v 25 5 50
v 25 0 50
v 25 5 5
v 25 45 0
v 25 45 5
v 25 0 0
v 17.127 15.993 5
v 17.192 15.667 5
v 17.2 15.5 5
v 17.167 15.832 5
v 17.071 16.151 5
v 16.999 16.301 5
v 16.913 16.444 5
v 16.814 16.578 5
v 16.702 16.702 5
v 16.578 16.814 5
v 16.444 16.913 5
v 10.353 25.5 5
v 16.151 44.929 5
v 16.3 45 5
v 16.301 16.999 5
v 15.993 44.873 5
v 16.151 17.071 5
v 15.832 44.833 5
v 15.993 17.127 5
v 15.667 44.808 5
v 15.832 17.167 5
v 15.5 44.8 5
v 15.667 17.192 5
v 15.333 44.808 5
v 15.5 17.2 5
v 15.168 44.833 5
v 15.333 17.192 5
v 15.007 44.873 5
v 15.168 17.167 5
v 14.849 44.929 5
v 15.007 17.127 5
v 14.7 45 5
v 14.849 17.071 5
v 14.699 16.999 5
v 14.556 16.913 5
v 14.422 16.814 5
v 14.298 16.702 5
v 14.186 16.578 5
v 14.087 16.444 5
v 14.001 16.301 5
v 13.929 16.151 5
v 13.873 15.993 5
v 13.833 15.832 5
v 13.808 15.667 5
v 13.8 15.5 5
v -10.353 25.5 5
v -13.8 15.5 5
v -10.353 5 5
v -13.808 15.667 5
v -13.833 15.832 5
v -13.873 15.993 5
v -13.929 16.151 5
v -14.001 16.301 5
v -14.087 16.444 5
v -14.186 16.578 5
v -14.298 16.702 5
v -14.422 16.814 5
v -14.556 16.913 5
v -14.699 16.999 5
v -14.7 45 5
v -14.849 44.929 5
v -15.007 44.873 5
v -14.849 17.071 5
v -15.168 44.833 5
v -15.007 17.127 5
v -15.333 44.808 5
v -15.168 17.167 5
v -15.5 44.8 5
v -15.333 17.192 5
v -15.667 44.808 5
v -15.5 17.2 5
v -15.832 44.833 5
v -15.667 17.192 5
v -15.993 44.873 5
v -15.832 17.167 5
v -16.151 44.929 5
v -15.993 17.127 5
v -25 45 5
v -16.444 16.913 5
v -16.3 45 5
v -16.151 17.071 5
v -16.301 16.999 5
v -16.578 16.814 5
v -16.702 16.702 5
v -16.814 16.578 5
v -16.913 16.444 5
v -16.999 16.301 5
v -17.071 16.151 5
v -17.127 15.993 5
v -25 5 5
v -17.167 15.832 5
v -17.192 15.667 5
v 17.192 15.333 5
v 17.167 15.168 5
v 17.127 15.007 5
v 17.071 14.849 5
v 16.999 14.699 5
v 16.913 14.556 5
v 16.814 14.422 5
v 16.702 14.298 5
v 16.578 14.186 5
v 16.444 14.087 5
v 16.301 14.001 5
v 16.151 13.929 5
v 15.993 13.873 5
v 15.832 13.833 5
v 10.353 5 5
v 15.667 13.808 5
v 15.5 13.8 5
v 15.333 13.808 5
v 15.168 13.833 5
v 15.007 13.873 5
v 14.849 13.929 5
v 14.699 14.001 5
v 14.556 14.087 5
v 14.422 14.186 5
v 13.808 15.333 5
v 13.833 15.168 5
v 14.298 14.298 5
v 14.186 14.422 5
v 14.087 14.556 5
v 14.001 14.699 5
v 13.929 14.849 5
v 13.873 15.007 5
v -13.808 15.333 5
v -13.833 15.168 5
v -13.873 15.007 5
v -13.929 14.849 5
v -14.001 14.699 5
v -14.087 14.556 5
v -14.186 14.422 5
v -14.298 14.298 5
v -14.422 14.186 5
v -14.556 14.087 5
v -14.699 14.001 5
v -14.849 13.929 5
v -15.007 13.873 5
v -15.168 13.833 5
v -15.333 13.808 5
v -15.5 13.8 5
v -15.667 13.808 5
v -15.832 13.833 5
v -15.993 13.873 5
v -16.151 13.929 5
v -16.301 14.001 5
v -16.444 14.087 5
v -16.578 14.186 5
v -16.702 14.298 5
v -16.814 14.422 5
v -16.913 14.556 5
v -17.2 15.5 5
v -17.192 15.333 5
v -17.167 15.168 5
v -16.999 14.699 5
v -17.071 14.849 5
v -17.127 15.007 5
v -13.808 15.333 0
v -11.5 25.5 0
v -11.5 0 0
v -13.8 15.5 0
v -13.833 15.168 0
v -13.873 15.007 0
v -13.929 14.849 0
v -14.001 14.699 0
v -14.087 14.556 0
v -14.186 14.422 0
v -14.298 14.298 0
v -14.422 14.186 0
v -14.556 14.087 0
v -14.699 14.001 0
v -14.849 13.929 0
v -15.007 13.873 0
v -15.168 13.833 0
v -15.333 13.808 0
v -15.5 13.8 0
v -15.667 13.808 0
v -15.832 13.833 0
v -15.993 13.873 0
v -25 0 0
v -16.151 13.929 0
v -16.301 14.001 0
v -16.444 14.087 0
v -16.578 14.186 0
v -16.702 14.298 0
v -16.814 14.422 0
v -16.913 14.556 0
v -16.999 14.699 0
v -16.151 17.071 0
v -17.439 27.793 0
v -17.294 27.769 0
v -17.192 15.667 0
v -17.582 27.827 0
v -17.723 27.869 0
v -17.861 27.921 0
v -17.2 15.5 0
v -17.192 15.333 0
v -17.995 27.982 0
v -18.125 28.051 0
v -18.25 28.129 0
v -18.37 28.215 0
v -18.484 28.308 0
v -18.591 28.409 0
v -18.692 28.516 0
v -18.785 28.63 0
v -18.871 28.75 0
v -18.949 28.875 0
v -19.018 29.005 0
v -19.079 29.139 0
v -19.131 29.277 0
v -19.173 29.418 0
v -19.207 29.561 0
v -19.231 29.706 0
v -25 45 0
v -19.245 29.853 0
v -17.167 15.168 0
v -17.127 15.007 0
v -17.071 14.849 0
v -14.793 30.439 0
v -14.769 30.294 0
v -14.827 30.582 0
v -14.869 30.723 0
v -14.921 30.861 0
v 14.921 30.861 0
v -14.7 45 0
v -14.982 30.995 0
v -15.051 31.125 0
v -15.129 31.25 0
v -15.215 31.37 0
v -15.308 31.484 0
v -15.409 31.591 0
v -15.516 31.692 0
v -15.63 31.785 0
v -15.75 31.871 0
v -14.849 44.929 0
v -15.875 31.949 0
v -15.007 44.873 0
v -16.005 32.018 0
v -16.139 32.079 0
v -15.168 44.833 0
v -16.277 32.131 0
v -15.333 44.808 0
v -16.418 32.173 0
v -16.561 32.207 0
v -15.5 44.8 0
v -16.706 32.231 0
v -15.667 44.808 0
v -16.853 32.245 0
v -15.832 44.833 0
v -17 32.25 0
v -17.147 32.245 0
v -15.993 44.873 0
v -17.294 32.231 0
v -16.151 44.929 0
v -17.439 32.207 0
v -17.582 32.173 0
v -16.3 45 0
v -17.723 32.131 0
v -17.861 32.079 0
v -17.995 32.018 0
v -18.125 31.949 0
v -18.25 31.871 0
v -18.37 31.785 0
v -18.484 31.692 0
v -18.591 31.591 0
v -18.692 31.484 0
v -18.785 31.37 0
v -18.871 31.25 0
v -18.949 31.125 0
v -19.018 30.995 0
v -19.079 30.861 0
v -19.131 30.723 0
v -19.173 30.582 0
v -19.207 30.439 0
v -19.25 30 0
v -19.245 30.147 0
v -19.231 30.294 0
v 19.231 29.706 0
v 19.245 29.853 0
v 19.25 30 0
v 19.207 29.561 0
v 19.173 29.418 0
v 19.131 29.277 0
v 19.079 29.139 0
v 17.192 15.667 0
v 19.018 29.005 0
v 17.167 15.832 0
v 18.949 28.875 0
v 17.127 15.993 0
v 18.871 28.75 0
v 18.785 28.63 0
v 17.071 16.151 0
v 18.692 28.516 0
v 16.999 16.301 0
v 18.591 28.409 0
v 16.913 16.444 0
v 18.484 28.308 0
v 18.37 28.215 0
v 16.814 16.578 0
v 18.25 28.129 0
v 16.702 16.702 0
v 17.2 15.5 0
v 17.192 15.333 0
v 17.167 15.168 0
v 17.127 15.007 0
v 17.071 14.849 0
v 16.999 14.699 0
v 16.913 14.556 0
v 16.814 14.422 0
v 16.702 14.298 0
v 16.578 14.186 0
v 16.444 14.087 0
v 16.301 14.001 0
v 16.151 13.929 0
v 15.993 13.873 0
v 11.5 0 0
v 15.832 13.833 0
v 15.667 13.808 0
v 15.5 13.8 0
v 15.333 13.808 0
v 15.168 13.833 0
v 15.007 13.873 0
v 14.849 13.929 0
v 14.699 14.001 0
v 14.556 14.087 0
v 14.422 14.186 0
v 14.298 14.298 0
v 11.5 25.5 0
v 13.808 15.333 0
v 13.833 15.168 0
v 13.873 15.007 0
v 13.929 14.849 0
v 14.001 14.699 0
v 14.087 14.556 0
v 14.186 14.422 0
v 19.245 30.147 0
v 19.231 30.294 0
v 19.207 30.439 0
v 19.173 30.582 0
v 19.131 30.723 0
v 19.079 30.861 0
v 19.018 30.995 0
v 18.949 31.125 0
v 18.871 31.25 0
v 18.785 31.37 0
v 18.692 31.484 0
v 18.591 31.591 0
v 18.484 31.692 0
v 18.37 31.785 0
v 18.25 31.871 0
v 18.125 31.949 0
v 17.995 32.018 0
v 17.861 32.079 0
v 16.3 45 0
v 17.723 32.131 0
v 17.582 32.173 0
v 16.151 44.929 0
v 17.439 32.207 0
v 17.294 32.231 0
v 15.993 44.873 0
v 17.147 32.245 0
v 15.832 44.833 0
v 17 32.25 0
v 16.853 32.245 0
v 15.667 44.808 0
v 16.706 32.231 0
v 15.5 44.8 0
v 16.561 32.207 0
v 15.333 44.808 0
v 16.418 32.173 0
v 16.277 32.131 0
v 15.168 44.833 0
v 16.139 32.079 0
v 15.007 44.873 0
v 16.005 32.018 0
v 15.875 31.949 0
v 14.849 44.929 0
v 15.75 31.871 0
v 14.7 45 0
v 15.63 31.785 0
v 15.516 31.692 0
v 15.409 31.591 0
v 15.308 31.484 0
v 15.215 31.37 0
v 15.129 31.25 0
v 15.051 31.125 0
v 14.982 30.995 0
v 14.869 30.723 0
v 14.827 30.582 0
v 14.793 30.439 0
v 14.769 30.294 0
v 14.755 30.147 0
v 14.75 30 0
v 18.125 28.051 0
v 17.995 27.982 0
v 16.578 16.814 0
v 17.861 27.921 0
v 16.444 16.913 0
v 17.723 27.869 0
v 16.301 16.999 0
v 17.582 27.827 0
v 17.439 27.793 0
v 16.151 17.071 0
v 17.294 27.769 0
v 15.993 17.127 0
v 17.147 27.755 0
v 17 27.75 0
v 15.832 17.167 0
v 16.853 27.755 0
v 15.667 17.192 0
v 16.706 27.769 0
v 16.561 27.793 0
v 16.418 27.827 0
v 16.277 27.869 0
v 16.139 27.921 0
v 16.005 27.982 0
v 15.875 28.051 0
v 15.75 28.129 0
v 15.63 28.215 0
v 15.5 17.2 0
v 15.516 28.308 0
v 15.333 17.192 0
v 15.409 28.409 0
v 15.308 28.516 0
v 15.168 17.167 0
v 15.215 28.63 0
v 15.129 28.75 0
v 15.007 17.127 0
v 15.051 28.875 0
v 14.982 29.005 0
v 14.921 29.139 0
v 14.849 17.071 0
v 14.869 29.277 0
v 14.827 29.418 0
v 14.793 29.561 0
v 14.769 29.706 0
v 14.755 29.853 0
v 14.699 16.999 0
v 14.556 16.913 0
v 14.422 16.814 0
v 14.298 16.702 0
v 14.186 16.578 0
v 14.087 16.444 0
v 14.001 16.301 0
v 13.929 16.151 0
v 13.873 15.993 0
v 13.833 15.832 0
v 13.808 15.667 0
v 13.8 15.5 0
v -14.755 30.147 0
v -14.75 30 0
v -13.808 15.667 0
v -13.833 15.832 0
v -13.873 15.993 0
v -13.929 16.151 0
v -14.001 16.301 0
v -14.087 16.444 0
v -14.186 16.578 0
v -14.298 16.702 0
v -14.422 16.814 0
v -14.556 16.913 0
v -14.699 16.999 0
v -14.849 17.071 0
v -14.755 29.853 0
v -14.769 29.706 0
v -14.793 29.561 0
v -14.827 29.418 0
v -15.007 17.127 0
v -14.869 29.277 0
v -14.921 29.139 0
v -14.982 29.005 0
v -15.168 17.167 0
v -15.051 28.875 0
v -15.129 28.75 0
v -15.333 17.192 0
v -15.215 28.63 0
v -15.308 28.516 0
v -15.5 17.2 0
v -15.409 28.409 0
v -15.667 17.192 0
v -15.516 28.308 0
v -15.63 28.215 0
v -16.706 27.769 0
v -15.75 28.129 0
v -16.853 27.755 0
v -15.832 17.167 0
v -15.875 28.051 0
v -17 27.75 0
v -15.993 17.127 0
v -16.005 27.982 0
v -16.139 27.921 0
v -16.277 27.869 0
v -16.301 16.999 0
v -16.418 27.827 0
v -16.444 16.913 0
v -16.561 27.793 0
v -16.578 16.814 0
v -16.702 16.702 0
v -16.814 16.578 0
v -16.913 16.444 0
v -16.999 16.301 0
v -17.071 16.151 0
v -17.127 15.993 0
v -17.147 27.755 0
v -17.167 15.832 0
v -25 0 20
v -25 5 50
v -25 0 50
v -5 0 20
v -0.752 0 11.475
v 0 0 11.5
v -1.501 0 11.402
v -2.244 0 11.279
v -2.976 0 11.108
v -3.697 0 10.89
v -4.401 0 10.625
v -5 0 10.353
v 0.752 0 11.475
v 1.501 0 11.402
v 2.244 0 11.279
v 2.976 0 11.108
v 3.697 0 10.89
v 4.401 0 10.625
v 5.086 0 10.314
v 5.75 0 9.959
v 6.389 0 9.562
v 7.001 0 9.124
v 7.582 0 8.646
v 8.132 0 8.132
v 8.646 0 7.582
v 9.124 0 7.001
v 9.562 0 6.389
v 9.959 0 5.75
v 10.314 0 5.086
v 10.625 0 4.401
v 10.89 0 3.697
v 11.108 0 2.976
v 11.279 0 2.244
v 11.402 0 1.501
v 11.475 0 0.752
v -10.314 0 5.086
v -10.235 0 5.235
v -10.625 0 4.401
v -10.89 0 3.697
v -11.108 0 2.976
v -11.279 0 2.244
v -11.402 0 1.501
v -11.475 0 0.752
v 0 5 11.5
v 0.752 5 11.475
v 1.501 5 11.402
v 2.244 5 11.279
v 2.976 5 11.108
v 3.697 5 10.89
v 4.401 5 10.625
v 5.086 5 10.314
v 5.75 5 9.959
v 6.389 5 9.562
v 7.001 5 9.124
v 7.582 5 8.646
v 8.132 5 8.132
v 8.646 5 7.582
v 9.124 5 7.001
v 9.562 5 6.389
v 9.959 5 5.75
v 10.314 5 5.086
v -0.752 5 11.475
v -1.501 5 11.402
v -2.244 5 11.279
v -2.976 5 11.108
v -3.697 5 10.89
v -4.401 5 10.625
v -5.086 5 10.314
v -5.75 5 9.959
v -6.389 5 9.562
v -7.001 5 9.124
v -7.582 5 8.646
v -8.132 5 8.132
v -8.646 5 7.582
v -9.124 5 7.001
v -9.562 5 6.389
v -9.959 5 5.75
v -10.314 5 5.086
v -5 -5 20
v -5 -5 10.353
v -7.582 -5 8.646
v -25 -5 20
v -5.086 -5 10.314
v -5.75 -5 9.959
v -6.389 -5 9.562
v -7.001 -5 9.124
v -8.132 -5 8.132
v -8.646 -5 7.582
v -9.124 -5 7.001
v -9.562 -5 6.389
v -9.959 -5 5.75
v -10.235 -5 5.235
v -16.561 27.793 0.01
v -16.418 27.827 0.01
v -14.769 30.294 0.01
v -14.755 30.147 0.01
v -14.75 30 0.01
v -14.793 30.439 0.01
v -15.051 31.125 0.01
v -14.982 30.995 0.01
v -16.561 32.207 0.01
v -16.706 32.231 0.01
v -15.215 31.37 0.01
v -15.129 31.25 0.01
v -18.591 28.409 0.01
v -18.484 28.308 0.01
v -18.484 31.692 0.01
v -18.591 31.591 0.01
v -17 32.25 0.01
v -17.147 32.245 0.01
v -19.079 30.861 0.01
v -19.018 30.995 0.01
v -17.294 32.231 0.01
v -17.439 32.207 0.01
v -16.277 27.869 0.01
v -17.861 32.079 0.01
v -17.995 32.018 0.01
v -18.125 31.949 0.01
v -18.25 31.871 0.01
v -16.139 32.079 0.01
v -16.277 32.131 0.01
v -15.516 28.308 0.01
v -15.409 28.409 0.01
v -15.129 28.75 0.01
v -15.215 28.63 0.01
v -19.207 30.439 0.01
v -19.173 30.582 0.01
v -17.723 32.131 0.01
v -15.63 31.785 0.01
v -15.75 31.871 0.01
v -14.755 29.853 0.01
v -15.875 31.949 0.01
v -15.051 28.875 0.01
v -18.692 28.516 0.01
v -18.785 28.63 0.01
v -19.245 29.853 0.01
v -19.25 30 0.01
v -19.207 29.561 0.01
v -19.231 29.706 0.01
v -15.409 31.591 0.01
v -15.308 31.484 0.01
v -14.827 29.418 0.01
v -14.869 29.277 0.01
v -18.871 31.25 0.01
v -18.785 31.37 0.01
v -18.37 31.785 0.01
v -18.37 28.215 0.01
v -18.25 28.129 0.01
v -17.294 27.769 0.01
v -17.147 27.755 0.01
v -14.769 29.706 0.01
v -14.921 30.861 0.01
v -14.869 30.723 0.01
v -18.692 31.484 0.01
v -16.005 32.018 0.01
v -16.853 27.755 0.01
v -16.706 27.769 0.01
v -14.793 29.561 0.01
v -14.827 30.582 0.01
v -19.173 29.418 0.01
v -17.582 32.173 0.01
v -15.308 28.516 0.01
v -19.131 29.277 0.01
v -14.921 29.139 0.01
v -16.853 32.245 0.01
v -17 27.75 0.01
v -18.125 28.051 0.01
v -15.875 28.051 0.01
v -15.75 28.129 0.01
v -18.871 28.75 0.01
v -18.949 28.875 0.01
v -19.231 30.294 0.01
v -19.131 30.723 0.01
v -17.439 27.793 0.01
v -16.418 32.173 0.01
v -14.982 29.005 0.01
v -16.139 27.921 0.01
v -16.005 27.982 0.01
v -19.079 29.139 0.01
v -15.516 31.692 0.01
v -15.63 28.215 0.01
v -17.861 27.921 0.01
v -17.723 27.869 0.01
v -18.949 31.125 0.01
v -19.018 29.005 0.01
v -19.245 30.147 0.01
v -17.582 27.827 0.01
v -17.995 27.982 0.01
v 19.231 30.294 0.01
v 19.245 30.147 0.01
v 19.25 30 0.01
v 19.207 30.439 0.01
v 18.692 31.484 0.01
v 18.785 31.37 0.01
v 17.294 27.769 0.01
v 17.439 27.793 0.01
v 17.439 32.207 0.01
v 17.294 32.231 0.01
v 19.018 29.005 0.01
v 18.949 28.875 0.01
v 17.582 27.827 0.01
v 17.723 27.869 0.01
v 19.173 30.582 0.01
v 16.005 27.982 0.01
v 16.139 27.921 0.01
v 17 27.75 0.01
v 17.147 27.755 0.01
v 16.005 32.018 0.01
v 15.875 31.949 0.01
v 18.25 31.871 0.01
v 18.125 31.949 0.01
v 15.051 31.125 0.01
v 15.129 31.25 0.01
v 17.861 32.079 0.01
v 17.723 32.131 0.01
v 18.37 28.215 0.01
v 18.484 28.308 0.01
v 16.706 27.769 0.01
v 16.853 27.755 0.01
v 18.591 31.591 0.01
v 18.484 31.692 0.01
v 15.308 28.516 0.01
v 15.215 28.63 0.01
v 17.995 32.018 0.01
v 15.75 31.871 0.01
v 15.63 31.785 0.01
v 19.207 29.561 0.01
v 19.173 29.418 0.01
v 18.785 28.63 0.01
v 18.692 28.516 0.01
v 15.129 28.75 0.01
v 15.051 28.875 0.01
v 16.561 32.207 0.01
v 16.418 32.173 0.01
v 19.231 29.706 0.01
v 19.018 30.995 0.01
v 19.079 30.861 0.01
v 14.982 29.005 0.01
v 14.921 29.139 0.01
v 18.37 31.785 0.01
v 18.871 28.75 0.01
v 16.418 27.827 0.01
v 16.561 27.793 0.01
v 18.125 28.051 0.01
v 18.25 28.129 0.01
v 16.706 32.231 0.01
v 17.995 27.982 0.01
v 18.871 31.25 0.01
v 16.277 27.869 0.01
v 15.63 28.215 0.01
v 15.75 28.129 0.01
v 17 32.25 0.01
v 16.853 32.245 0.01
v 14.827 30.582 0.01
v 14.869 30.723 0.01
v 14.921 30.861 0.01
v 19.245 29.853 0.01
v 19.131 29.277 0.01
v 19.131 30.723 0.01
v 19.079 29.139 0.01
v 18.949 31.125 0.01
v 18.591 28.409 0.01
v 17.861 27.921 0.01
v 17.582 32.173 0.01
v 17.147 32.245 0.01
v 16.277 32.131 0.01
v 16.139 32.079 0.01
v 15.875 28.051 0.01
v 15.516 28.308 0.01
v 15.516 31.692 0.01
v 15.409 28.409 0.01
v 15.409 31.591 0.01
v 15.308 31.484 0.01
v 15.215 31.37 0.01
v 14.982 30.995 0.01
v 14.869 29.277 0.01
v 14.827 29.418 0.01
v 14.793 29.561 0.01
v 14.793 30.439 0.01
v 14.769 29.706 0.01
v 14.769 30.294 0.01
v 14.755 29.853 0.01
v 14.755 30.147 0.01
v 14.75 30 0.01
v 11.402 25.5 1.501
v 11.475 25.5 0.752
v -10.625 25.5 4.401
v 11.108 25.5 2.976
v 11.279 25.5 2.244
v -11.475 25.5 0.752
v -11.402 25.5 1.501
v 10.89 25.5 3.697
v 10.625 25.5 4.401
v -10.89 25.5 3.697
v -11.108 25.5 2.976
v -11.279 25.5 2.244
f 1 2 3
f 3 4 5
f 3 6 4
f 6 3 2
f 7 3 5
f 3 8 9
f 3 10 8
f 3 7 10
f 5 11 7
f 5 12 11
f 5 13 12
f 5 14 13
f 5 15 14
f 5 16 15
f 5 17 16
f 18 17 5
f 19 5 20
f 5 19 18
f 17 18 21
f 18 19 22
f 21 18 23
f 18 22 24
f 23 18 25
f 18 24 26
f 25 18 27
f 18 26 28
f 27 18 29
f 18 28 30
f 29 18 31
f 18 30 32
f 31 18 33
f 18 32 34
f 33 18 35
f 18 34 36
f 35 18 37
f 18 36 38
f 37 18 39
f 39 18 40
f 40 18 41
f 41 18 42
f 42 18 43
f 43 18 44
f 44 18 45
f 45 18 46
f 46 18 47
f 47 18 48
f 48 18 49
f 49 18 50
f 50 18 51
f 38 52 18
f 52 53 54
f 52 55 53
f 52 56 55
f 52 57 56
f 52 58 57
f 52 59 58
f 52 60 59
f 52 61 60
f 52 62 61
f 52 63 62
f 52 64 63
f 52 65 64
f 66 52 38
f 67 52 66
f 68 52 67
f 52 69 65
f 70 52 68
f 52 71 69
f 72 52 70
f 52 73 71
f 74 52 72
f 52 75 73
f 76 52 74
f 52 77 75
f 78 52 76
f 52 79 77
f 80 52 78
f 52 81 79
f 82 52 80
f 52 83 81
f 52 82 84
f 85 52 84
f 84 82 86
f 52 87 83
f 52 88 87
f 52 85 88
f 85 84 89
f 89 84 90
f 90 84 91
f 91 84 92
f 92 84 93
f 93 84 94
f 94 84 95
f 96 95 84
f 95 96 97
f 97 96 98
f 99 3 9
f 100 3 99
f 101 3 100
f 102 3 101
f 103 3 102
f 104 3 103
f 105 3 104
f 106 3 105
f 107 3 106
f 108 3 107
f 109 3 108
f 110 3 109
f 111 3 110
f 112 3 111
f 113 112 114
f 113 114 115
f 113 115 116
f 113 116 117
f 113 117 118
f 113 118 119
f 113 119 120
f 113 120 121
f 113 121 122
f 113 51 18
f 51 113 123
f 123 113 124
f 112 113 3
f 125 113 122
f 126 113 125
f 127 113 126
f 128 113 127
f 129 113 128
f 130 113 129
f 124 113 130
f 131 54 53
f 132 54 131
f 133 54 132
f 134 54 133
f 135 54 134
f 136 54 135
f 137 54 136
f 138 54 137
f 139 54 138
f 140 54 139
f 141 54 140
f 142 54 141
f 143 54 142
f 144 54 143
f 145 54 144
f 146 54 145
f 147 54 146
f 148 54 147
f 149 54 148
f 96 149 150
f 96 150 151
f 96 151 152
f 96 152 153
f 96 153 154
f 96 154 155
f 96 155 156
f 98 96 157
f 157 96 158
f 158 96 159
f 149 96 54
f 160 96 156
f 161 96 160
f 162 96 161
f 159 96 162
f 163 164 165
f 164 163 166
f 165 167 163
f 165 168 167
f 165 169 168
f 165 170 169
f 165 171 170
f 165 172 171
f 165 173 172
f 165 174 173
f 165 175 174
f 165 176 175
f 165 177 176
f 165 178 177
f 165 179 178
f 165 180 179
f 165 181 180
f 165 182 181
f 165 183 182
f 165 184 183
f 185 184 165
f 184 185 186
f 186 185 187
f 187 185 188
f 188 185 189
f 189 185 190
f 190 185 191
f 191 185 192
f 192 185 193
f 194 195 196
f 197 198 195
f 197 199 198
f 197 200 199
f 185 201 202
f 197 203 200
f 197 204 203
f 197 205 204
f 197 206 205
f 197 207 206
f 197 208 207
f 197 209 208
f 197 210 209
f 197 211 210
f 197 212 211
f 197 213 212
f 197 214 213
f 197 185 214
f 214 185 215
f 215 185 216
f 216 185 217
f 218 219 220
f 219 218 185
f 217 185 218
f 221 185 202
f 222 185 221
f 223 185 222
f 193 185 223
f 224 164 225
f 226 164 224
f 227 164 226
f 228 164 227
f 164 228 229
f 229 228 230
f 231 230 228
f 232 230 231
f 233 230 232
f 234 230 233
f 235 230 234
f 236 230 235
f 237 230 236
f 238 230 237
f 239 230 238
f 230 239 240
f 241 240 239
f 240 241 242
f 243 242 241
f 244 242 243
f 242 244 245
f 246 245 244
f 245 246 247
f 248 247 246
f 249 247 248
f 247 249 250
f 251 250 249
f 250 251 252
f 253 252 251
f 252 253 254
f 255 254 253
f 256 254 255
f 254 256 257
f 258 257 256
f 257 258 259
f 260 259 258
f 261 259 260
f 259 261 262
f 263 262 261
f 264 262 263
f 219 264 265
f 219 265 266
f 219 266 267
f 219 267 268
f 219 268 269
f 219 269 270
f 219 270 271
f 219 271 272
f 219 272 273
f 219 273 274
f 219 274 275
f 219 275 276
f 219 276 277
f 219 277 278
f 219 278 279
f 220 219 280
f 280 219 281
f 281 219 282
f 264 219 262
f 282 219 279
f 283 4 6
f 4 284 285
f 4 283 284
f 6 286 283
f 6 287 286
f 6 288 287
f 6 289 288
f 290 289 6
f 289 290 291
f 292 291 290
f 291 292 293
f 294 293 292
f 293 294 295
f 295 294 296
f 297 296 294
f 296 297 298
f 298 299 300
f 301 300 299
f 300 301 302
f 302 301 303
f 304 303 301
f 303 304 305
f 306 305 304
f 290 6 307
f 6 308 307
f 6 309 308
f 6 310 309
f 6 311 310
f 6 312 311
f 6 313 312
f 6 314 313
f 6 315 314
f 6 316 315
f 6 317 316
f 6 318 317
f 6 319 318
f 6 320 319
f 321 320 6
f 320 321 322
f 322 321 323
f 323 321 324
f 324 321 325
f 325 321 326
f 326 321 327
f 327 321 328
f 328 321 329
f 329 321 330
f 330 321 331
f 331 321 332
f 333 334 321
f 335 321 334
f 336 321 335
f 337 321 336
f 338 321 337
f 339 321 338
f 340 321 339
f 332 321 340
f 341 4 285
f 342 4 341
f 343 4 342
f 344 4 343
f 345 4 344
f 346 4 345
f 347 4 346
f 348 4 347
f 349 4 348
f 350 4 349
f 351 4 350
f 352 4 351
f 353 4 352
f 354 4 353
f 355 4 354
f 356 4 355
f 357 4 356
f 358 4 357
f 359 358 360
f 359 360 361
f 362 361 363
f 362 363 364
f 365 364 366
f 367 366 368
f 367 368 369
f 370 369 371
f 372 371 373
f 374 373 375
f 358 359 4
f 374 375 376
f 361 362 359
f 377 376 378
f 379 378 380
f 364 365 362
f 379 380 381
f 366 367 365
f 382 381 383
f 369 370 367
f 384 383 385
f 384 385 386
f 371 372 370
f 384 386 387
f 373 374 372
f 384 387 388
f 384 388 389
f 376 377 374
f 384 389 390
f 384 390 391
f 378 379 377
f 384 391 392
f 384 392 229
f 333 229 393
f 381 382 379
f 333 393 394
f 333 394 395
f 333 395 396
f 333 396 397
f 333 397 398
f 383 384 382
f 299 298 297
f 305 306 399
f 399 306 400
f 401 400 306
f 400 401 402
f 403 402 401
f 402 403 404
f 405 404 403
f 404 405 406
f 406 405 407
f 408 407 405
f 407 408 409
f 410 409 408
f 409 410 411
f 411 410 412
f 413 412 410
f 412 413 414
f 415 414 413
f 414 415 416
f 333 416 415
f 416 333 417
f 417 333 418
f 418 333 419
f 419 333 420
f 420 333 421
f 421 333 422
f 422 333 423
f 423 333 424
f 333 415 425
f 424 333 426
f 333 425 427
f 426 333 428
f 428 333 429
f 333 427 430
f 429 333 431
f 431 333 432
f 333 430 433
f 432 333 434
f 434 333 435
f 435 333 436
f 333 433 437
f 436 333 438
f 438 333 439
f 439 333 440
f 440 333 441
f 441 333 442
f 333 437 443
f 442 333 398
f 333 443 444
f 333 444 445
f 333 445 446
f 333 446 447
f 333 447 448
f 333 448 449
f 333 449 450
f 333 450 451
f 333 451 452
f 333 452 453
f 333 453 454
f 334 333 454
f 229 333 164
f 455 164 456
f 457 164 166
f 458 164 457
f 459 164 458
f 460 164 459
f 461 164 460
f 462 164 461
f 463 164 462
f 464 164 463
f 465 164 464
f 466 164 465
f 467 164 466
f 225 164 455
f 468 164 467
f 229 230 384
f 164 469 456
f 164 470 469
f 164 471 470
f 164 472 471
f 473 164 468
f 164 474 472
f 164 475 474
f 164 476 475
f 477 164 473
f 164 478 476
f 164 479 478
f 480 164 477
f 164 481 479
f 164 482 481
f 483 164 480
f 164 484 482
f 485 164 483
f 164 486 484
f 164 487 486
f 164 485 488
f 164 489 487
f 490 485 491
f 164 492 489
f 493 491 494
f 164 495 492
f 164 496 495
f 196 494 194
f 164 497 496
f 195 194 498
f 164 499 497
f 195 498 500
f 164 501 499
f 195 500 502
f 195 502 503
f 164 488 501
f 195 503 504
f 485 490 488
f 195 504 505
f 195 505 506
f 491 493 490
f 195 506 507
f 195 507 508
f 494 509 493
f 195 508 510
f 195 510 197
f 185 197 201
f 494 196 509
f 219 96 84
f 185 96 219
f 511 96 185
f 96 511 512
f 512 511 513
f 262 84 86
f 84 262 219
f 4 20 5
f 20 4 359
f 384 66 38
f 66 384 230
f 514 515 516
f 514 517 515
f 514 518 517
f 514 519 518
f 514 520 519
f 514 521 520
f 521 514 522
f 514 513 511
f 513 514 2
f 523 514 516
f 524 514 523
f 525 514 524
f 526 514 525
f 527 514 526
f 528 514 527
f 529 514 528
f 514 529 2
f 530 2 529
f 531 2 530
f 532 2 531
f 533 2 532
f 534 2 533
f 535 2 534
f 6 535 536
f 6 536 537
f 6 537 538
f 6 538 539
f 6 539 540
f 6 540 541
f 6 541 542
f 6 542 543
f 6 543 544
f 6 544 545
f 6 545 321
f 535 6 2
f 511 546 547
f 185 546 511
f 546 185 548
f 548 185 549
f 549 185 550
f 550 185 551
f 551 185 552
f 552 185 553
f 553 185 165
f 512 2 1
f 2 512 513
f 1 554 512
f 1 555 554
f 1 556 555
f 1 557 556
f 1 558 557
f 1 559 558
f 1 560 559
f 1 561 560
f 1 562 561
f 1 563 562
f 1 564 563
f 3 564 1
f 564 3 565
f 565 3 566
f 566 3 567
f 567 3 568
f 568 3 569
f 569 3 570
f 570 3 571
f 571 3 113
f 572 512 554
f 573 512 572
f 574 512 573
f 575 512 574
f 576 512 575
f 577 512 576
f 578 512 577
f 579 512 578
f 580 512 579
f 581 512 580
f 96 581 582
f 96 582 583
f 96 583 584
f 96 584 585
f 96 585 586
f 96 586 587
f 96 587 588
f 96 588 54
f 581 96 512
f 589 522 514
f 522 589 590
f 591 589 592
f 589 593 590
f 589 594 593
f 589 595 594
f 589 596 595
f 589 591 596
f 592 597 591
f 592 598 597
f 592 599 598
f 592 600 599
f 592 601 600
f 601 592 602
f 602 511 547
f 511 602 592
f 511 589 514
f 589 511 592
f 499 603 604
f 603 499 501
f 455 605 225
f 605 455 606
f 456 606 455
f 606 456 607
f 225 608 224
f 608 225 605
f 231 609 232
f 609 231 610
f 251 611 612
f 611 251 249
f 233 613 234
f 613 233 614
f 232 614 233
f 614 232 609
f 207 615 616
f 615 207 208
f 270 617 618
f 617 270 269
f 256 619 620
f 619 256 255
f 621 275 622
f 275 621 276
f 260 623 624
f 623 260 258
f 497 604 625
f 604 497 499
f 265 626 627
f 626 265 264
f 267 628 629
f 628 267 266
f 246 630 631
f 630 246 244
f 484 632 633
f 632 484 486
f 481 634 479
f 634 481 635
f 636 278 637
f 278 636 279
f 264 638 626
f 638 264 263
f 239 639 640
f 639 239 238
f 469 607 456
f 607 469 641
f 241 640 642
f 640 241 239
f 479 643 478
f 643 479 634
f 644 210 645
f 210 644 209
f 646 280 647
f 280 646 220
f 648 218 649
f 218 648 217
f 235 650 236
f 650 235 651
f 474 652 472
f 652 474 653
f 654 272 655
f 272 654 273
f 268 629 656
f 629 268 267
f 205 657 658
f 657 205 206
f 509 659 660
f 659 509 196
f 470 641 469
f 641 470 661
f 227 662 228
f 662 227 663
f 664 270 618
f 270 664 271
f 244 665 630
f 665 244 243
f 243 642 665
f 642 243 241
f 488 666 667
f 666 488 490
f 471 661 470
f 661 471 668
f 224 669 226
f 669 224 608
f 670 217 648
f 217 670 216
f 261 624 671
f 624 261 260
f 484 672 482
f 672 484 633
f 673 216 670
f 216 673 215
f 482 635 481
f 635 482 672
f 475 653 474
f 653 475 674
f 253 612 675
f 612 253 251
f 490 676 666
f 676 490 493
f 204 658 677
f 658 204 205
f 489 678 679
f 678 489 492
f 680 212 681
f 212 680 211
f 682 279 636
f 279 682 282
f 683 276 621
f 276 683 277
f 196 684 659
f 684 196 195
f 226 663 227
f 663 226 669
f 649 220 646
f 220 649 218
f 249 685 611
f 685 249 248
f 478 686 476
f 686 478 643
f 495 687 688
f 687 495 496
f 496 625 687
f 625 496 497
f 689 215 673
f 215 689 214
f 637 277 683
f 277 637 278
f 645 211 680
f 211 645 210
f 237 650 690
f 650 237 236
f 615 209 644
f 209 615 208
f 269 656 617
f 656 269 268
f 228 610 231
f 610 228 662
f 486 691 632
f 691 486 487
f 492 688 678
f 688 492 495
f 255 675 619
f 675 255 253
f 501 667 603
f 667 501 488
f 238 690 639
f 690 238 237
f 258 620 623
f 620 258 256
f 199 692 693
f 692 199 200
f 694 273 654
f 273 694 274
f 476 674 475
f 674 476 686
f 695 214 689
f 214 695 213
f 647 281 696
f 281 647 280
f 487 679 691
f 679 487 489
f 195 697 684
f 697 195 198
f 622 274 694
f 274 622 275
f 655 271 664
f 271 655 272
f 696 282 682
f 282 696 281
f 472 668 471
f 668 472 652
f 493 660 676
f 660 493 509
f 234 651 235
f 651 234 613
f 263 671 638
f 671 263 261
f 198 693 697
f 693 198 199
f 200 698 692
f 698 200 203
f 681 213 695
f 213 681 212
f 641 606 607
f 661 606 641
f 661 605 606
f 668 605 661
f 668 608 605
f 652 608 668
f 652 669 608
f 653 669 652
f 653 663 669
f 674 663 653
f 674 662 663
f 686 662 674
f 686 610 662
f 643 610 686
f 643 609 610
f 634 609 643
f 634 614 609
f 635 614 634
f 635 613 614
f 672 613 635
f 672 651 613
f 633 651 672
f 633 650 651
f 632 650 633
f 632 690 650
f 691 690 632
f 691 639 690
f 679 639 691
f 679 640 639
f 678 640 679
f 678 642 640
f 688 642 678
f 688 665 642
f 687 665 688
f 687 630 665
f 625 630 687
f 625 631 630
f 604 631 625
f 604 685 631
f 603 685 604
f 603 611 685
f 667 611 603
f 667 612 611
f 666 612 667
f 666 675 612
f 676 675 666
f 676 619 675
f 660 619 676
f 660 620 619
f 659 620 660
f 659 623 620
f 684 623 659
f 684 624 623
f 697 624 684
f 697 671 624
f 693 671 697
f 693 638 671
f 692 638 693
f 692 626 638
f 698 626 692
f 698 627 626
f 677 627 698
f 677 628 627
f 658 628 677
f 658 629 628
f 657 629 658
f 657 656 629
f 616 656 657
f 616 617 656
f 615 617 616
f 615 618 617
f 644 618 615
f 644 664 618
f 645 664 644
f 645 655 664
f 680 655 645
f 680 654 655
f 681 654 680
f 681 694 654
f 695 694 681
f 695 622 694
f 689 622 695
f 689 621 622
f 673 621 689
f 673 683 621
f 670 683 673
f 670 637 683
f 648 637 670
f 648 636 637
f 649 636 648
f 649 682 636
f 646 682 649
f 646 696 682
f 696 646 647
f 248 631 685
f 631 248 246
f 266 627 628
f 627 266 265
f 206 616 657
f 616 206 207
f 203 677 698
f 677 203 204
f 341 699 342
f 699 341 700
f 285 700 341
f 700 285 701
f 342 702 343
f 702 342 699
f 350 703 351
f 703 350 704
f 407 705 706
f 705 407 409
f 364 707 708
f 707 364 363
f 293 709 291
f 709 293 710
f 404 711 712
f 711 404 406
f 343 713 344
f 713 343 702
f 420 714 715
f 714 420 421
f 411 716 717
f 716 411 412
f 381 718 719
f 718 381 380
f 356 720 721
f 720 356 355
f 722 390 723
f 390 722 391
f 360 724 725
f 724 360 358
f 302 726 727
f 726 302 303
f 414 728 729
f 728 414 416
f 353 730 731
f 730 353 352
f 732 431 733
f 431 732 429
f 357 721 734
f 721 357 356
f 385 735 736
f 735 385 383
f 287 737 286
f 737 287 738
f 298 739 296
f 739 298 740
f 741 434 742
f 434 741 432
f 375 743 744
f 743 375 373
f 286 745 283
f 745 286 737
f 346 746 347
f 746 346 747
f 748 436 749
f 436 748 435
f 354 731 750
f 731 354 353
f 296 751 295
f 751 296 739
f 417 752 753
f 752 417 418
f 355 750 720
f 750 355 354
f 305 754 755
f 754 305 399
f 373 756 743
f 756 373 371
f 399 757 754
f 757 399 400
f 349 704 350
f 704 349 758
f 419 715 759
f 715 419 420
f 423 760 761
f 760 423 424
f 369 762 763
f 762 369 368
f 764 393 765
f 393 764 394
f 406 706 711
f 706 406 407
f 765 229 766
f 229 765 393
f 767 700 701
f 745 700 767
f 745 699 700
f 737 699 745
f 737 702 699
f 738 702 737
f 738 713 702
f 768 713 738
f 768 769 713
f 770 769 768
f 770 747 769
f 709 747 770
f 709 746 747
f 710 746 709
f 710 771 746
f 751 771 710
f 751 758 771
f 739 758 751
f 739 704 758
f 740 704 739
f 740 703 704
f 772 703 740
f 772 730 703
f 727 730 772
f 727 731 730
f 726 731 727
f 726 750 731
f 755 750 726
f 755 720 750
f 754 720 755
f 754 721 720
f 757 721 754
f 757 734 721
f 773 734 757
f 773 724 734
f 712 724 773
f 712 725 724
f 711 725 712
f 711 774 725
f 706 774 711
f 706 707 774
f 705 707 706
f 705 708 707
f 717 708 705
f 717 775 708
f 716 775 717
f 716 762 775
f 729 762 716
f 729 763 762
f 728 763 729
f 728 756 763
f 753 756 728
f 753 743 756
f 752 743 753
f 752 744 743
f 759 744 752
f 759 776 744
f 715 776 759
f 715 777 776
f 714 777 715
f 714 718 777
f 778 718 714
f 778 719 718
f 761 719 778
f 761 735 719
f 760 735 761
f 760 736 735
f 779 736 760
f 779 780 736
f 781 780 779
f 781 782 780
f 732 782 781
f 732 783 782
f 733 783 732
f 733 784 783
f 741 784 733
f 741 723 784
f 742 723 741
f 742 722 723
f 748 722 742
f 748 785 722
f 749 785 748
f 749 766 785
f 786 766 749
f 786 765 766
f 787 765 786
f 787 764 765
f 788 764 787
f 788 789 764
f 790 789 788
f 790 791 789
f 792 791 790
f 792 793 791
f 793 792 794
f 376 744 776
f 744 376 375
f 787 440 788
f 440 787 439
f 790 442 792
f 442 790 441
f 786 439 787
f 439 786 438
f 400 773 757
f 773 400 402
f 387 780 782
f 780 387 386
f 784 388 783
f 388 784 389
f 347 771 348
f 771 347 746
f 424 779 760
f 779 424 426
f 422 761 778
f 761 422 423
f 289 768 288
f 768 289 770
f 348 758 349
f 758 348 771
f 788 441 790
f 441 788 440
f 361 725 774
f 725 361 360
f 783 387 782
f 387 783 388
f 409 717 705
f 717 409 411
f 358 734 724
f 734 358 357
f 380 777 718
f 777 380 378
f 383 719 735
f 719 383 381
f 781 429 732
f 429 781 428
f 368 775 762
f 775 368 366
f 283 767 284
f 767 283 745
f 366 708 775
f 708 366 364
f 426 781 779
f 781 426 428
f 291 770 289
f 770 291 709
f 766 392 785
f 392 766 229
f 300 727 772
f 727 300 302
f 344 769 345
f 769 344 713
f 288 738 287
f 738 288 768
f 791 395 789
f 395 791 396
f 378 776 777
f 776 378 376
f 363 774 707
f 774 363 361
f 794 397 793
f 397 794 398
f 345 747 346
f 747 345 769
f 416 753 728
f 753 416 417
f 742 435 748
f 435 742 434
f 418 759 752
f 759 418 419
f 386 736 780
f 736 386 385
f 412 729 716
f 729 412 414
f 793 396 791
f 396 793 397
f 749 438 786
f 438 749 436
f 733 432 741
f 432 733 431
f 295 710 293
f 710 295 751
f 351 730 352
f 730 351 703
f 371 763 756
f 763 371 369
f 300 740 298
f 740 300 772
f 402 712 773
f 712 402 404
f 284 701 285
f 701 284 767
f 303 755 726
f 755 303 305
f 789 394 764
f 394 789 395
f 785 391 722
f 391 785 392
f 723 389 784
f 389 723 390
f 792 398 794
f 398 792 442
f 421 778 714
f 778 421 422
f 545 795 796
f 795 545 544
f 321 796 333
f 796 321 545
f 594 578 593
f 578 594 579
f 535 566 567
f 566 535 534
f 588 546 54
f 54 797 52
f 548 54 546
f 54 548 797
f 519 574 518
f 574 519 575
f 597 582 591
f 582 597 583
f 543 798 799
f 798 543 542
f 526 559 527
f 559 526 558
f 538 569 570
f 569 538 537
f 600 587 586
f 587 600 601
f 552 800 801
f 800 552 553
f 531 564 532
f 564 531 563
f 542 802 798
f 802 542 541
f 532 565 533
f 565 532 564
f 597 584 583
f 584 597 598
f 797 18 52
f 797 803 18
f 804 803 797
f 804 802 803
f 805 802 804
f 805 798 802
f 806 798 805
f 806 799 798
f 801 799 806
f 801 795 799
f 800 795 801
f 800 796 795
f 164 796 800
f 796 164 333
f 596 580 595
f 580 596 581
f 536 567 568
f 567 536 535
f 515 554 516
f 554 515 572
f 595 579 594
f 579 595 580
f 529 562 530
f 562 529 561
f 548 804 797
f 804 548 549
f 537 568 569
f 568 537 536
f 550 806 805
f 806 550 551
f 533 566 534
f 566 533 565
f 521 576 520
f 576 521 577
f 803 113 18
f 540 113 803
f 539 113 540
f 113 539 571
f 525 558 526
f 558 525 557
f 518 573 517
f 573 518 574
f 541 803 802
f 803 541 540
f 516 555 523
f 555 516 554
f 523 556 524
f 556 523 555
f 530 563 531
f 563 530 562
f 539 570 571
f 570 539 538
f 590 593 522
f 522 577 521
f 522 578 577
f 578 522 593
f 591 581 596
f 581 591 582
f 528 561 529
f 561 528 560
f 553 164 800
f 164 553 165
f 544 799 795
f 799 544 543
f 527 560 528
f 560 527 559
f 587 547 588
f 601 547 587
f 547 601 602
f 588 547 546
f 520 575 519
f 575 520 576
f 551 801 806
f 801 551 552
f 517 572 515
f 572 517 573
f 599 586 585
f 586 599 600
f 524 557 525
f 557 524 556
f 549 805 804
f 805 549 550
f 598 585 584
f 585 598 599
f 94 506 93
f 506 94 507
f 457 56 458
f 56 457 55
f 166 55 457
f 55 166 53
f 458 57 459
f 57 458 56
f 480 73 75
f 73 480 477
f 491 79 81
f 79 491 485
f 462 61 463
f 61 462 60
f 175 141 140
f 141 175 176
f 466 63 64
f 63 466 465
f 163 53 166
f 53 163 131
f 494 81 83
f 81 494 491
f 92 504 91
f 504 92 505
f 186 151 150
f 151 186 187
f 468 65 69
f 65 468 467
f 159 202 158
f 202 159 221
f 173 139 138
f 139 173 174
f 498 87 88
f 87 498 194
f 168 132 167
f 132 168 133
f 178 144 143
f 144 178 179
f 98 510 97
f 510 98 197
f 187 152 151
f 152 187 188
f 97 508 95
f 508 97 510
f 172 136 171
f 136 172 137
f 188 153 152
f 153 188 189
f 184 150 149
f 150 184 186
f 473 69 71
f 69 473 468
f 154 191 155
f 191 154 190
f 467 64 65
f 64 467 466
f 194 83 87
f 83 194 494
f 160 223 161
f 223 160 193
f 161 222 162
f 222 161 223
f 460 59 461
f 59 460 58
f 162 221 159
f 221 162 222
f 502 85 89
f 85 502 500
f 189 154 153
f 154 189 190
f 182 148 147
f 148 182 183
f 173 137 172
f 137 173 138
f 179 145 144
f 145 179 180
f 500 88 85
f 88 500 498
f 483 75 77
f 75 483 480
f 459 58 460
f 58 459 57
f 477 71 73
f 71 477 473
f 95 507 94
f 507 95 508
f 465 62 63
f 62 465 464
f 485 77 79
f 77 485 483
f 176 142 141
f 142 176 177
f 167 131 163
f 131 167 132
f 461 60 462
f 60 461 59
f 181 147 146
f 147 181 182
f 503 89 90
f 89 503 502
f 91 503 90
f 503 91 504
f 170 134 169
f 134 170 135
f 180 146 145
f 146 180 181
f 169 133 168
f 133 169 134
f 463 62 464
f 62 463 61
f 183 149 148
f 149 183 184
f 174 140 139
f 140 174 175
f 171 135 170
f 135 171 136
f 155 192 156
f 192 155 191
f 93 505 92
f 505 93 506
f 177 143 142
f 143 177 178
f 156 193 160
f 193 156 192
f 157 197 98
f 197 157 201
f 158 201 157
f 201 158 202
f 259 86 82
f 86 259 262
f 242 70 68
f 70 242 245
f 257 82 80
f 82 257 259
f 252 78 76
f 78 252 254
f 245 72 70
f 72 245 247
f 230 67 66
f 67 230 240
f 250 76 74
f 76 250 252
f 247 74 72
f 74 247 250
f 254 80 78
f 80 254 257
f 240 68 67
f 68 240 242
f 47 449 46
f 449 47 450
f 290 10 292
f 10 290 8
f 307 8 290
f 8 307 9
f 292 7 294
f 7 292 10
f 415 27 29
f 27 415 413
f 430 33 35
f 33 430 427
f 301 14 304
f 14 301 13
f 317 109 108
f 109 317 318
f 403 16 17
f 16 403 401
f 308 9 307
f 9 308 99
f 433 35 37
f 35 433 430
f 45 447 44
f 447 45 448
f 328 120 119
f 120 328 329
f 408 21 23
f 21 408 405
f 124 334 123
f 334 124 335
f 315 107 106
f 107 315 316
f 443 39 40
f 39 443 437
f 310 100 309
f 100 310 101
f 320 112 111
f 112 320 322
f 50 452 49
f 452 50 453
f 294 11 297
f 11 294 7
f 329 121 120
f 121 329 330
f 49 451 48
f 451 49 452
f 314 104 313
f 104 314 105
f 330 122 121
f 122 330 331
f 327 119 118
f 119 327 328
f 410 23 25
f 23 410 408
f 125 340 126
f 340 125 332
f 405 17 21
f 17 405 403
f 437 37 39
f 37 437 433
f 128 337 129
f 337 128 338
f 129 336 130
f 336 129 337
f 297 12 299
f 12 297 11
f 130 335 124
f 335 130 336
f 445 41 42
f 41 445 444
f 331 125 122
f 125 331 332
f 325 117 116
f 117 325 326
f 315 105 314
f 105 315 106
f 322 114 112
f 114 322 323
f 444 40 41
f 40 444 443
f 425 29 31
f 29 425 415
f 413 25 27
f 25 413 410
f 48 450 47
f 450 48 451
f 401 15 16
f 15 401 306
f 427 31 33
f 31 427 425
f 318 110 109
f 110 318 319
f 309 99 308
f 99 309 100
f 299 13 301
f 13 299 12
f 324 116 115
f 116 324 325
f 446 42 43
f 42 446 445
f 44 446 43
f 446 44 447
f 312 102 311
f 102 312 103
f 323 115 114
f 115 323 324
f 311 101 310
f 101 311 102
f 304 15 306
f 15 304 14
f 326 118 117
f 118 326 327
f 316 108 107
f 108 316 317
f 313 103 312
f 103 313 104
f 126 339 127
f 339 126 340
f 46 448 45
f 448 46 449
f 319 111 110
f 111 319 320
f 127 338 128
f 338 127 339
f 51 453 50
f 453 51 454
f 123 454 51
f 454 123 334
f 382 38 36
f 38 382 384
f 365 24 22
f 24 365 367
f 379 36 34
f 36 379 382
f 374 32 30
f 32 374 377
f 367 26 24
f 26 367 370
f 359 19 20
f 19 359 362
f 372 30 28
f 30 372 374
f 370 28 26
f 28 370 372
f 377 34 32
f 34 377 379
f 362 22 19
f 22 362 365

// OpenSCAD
// L-shaped mounting bracket for NEMA 17 stepper motor
// Print orientation: base plate on bed (z = 0), vertical plate builds upward (+Z)

// ---------------- Parameters ----------------
base_x0      = -25;   // base plate X start
base_x1      = 25;    // base plate X end
base_y0      = 0;     // base plate Y start
base_y1      = 45;    // base plate Y end
base_z       = 5;     // base plate thickness

motor_h      = 50;    // vertical motor plate height
motor_y0     = 0;     // motor plate Y start (flush with base edge)
motor_y1     = 5;     // motor plate Y end (thickness)

boss_d       = 23;    // motor centring boss hole diameter
boss_x       = 0;     // boss hole X centre
boss_z       = 28;    // boss hole Z centre

screw_d      = 3.4;   // M3 screw hole diameter
screw_n      = 4;     // number of screw holes
screw_p      = 31;    // square pattern pitch (side length)

gusset_t     = 5;     // gusset thickness (along X)
gusset_leg   = 20;    // right-triangle leg length (along Y and Z)
gusset_x0    = -25;   // left gusset X start
gusset_x1    = -20;   // left gusset X end
// right gusset runs from x = 20 to x = 25 (flush with right edge)

eps          = 0.5;   // cutter overshoot past faces

$fn = 96;

// ---------------- Model ----------------
difference() {
    union() {
        // Base plate
        translate([base_x0, base_y0, 0])
            cube([base_x1 - base_x0, base_y1 - base_y0, base_z]);

        // Vertical motor plate
        translate([base_x0, motor_y0, 0])
            cube([base_x1 - base_x0, motor_y1 - motor_y0, motor_h]);

        // Gussets (right-triangle in YZ plane, extruded along X)
        for (sx = [-1, 1]) {
            x0 = sx == -1 ? gusset_x0 : gusset_x1;
            x1 = sx == -1 ? gusset_x1 : gusset_x0;
            translate([x0, 0, 0])
                rotate([90, 0, 0])
                    linear_extrude(height = x1 - x0)
                        polygon(points = [
                            [gusset_leg, gusset_leg],  // right-angle corner at y = 5, z = 5
                            [gusset_leg, 0],
                            [0, gusset_leg]
                        ]);
        }
    }

    // Base plate through-holes (M4)
    for (h = [base_z + eps, -eps]) {
        translate([-17, 30, h])
            cylinder(d = 4.5, h = abs(h) + 0.01);
        translate([17, 30, h])
            cylinder(d = 4.5, h = abs(h) + 0.01);
    }

    // Motor boss hole (along Y) and screw holes on square pattern
    {
        translate([0, 0, 0])
            rotate([90, 0, 0]) {
                difference() {
                    cylinder(d = boss_d, h = motor_h + 2 * eps, center = true);
                    translate([0, -eps, boss_z])
                        cylinder(d = boss_d + 2 * eps, h = motor_h + 2 * eps);
                }
            }
        for (i = [0 : screw_n - 1]) {
            for (j = [0 : screw_n - 1]) {
                translate([(i - (screw_n - 1) / 2) * screw_p,
                           (j - (screw_n - 1) / 2) * screw_p,
                           -eps])
                    cylinder(d = screw_d, h = motor_h + 2 * eps, $fn = 64);
            }
        }
    }
}
